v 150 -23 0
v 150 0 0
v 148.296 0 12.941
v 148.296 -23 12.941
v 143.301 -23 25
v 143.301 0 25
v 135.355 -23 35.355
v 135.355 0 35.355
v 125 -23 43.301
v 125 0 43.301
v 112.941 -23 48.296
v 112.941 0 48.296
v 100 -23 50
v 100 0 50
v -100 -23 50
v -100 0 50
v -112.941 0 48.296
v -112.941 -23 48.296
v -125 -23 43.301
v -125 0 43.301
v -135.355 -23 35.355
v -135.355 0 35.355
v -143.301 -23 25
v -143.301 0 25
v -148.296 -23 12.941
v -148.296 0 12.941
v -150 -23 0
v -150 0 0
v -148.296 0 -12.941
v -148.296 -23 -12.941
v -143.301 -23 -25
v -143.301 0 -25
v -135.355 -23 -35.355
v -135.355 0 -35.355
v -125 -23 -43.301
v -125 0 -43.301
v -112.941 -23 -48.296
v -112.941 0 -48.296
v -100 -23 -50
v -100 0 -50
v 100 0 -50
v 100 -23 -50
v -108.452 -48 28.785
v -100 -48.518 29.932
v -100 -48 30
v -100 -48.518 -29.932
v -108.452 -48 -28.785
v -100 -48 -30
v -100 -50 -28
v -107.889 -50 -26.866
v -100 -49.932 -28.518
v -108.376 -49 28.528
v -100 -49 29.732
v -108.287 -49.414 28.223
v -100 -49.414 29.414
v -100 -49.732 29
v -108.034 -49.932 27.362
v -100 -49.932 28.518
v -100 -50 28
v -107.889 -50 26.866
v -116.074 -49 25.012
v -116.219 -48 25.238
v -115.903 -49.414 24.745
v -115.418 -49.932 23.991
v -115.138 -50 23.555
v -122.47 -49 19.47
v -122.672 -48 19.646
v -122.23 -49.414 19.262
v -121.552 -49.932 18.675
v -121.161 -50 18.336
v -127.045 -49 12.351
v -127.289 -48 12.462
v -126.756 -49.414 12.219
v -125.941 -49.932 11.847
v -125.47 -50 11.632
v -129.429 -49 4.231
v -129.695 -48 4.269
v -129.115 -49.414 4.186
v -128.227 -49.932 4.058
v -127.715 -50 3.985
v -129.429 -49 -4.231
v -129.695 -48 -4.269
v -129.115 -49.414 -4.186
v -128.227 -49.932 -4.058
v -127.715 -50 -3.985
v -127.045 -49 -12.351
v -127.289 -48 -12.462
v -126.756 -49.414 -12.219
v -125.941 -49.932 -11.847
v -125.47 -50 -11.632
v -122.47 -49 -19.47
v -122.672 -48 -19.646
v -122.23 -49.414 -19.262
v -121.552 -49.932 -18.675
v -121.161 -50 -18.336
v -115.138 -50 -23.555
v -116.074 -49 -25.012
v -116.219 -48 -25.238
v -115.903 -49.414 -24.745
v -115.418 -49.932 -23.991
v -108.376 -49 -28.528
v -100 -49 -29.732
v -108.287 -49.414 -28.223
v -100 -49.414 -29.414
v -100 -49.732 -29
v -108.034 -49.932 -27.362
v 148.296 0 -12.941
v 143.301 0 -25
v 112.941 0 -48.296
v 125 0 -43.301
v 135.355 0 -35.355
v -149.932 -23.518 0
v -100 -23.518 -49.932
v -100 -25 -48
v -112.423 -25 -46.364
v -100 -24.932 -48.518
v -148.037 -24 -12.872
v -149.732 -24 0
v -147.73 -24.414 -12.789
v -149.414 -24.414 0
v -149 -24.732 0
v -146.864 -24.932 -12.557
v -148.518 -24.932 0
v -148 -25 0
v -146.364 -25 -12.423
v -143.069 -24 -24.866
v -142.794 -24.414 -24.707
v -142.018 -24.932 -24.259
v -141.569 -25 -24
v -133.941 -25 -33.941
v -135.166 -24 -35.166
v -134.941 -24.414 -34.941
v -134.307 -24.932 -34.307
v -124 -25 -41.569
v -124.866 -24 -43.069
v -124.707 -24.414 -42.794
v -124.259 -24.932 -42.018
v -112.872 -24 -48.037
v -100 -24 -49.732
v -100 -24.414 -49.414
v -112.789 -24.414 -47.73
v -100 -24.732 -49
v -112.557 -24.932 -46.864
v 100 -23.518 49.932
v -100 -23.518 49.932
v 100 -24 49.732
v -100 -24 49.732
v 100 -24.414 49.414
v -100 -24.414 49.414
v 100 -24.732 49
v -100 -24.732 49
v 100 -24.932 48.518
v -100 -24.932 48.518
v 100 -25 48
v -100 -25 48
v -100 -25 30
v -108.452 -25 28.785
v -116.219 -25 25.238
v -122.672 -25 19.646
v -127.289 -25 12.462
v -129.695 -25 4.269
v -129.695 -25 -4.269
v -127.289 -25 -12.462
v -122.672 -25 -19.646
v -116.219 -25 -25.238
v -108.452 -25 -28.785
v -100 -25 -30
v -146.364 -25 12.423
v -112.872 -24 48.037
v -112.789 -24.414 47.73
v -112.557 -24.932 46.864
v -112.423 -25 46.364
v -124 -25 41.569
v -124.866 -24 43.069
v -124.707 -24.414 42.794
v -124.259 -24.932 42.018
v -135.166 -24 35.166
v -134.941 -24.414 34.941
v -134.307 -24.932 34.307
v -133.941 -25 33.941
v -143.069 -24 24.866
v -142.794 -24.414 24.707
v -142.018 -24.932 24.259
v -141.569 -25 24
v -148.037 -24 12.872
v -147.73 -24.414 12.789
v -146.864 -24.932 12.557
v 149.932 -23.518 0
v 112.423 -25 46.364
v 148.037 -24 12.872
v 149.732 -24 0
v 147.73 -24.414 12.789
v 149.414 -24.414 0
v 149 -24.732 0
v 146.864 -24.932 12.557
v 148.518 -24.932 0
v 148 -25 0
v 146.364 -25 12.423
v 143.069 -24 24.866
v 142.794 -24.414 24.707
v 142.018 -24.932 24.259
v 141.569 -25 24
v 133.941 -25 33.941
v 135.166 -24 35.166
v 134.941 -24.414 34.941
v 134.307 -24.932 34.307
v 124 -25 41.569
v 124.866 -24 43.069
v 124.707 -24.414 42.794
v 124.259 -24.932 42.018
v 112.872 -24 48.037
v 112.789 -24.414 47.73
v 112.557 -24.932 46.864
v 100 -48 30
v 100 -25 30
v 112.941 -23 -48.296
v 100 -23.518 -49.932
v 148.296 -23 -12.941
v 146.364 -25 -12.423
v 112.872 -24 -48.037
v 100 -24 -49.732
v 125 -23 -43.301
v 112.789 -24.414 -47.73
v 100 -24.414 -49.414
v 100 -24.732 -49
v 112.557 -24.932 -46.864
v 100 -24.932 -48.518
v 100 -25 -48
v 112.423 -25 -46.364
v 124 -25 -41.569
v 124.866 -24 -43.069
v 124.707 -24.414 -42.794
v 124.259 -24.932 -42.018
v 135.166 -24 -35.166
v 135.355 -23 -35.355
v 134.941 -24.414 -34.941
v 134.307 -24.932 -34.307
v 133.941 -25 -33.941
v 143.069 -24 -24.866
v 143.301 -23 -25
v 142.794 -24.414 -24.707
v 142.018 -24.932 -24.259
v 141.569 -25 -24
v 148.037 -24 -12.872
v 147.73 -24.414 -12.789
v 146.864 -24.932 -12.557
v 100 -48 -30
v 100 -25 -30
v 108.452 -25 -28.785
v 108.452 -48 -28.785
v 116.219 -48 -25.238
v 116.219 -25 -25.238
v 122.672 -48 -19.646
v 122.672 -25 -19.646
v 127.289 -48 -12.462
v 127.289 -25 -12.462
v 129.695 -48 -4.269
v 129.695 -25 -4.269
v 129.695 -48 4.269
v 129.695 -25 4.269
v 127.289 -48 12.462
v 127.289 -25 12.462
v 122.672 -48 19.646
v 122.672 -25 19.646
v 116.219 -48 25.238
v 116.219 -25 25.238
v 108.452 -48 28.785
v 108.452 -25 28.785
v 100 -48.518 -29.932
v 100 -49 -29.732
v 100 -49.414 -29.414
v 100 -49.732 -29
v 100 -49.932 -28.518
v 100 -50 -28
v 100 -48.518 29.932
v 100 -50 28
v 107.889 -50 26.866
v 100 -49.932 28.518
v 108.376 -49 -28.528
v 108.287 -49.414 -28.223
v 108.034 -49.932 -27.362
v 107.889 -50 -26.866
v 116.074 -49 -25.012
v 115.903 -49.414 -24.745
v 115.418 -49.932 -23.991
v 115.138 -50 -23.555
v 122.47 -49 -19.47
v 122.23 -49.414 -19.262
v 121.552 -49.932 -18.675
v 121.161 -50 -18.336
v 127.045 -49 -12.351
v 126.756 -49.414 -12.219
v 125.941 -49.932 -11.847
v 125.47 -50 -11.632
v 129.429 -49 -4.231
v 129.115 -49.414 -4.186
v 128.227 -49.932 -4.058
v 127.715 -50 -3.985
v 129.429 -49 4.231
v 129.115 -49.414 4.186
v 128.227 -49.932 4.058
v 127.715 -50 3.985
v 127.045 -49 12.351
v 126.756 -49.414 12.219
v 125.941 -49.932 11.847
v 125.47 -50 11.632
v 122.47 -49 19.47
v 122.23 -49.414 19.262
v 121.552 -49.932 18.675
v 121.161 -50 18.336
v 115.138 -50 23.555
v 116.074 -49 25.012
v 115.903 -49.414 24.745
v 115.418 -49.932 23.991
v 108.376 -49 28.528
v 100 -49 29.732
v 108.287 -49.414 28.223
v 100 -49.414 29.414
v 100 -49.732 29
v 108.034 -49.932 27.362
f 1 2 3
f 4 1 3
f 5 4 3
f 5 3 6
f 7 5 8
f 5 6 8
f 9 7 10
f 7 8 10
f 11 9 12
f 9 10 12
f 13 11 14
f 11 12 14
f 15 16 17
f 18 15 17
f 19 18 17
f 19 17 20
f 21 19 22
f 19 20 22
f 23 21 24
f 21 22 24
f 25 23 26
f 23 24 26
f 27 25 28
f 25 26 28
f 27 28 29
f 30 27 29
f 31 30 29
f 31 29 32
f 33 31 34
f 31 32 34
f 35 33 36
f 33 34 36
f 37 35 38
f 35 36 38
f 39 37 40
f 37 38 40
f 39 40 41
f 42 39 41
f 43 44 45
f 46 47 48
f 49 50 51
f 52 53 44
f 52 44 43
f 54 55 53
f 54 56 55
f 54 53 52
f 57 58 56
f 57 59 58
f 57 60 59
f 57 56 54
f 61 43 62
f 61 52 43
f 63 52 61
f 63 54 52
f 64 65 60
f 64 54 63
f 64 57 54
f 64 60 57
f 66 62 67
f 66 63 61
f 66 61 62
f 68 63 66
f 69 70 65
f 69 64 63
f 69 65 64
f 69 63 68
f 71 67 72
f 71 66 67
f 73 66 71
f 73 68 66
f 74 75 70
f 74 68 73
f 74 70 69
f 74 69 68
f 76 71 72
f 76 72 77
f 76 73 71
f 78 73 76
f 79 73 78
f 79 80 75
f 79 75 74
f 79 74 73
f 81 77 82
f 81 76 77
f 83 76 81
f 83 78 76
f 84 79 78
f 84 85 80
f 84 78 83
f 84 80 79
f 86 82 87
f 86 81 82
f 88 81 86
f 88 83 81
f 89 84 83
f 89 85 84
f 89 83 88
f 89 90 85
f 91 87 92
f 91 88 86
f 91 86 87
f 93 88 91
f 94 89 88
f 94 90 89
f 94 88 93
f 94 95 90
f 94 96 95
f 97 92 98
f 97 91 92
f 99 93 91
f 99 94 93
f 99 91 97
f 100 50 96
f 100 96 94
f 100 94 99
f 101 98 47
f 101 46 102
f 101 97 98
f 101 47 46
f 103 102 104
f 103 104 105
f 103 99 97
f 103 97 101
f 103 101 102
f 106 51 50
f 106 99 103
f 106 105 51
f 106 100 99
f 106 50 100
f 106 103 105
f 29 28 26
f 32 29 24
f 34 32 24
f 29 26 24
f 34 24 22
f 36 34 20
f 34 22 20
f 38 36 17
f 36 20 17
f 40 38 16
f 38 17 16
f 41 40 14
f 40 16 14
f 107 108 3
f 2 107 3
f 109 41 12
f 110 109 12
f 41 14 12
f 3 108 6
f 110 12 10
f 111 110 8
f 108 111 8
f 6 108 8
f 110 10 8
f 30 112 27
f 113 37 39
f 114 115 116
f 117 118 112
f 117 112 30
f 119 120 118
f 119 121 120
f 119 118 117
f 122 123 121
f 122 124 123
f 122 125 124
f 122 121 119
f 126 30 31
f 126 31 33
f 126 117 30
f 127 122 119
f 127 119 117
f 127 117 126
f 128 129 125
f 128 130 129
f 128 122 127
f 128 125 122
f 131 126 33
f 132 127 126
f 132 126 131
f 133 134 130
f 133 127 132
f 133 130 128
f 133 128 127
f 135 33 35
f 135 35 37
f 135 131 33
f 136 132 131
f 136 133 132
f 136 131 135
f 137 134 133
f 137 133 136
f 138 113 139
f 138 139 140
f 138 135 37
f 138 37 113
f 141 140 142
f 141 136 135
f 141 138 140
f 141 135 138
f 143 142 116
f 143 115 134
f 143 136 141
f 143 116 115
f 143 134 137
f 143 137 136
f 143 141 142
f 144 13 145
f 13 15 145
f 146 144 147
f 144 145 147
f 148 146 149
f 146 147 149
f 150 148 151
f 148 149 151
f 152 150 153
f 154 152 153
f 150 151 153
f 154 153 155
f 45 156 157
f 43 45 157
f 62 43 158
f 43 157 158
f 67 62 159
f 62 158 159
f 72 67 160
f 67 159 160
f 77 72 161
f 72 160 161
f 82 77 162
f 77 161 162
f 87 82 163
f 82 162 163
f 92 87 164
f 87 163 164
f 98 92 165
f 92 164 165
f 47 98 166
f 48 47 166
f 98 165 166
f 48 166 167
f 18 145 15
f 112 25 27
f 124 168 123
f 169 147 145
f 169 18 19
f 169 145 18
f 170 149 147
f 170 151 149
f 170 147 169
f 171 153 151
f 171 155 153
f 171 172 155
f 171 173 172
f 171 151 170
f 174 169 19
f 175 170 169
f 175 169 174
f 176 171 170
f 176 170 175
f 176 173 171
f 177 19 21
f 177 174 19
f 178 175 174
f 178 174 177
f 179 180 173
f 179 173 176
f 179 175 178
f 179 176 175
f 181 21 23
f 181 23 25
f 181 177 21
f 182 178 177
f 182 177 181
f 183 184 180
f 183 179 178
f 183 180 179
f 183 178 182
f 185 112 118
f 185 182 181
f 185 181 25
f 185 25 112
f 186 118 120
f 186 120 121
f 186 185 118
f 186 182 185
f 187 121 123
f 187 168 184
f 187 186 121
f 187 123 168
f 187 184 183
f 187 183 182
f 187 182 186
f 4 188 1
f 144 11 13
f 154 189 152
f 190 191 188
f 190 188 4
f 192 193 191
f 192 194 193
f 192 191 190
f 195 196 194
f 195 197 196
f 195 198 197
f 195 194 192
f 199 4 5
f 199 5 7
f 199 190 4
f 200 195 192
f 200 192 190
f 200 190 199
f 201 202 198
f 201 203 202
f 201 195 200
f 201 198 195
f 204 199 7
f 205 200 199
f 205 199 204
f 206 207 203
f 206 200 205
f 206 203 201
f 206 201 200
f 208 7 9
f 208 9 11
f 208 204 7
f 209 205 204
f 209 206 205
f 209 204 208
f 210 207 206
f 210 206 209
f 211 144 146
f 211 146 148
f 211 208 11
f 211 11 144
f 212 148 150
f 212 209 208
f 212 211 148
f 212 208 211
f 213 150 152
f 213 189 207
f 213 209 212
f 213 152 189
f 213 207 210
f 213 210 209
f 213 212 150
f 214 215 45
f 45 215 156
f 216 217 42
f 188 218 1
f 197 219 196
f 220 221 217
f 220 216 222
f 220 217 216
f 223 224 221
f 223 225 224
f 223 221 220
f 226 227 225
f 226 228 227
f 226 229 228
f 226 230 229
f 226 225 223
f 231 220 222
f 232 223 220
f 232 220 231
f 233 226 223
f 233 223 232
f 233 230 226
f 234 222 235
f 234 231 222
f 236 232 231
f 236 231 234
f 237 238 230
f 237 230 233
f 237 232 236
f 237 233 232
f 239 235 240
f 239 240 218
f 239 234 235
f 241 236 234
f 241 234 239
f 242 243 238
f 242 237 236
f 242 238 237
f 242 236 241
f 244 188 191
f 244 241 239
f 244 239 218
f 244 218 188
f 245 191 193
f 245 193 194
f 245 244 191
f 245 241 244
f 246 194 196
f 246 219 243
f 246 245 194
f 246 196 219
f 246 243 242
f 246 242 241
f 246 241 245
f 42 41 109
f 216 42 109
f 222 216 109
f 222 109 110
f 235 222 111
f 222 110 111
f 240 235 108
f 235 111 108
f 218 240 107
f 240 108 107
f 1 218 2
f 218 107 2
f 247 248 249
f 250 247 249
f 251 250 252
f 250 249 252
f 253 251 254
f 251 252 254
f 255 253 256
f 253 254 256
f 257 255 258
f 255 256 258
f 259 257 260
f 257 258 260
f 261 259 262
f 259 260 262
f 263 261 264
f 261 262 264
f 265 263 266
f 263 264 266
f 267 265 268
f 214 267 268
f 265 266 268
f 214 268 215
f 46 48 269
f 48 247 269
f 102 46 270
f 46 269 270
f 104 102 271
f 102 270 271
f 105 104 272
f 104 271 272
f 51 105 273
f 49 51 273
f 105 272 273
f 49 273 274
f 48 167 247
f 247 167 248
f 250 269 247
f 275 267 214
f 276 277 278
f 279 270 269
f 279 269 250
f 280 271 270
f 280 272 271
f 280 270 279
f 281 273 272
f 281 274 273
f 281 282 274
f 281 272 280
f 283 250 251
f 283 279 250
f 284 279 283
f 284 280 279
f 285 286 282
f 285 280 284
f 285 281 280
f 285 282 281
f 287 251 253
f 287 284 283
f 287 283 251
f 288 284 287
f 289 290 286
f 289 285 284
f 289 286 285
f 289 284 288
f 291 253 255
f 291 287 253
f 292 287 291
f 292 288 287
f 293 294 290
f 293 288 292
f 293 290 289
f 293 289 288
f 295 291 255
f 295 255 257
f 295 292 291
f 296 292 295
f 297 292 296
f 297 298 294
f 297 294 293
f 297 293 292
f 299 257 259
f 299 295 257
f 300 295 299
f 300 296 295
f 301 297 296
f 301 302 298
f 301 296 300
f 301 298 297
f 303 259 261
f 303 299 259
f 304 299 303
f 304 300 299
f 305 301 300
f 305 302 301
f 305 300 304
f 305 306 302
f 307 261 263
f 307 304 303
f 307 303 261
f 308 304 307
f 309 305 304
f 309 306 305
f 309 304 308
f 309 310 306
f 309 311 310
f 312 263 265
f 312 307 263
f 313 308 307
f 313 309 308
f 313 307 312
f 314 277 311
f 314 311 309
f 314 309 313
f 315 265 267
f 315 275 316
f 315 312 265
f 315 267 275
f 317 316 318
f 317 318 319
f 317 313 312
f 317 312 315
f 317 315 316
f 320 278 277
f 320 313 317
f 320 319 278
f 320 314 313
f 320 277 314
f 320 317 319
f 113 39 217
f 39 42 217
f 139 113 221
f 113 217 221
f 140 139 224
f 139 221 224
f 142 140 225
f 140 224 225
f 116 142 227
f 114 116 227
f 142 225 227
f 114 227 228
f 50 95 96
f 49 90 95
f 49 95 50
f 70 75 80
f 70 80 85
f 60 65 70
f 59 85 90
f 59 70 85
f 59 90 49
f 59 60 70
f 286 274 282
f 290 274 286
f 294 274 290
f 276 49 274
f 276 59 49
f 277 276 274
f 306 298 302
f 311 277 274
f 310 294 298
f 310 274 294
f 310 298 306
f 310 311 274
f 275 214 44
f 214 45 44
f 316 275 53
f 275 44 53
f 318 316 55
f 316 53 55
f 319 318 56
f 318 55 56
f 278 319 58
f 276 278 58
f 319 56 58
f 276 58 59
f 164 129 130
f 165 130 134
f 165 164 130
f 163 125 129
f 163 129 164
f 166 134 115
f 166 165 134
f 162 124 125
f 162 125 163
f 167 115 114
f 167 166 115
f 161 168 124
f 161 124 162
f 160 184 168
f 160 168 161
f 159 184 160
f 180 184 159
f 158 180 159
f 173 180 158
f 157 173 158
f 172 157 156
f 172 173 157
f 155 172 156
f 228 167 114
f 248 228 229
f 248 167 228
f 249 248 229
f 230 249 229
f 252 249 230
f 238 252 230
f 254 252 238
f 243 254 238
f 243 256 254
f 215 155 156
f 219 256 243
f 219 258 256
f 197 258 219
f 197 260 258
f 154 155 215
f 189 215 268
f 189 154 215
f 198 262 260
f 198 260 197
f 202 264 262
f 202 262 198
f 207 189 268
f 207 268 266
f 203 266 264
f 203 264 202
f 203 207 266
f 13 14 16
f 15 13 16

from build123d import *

# Parameters (mm, degrees)
F1_DEPTH = 50
F2_DEPTH = 25
F3_R     = 2


with BuildPart() as f1:
    # F0 (on Front) → F1 (new body)
    with BuildSketch(Plane.XZ):
        with BuildLine():
            Line((-100, -30), (100, -30))
            ThreePointArc((100, -30), (121.2132034356, -21.2132034356), (130, 0))
            ThreePointArc((130, 0), (121.2132034356, 21.2132034356), (100, 30))
            Line((100, 30), (-100, 30))
            ThreePointArc((-100, 30), (-121.2132034356, 21.2132034356), (-130, 0))
            ThreePointArc((-130, 0), (-121.2132034356, -21.2132034356), (-100, -30))
        make_face()
    extrude(amount=F1_DEPTH)

    # F0 (on Front) → F2 (join)
    with BuildSketch(Plane.XZ):
        with BuildLine():
            Line((-100, -50), (100, -50))
            ThreePointArc((100, -50), (135.3553390593, -35.3553390593), (150, 0))
            ThreePointArc((150, 0), (135.3553390593, 35.3553390593), (100, 50))
            Line((100, 50), (-100, 50))
            ThreePointArc((-100, 50), (-135.3553390593, 35.3553390593), (-150, 0))
            ThreePointArc((-150, 0), (-135.3553390593, -35.3553390593), (-100, -50))
        make_face()
        with BuildLine():
            ThreePointArc((130, 0), (121.2132034356, -21.2132034356), (100, -30))
            Line((100, -30), (-100, -30))
            ThreePointArc((-100, -30), (-121.2132034356, -21.2132034356), (-130, 0))
            ThreePointArc((-130, 0), (-121.2132034356, 21.2132034356), (-100, 30))
            Line((-100, 30), (100, 30))
            ThreePointArc((100, 30), (121.2132034356, 21.2132034356), (130, 0))
        make_face(mode=Mode.SUBTRACT)
    extrude(amount=F2_DEPTH)

    # F3
    f3_edges = [f1.edges().sort_by_distance(p)[0] for p in [
        (-150, -25, 0),
        (0, -50, -30),
        (0, -25, -50),
        (150, -25, 0),
        (0, -25, 50),
        (130, -50, 0),
        (0, -50, 30),
        (-130, -50, 0),
    ]]
    fillet(f3_edges, radius=F3_R)


solid = f1.part
